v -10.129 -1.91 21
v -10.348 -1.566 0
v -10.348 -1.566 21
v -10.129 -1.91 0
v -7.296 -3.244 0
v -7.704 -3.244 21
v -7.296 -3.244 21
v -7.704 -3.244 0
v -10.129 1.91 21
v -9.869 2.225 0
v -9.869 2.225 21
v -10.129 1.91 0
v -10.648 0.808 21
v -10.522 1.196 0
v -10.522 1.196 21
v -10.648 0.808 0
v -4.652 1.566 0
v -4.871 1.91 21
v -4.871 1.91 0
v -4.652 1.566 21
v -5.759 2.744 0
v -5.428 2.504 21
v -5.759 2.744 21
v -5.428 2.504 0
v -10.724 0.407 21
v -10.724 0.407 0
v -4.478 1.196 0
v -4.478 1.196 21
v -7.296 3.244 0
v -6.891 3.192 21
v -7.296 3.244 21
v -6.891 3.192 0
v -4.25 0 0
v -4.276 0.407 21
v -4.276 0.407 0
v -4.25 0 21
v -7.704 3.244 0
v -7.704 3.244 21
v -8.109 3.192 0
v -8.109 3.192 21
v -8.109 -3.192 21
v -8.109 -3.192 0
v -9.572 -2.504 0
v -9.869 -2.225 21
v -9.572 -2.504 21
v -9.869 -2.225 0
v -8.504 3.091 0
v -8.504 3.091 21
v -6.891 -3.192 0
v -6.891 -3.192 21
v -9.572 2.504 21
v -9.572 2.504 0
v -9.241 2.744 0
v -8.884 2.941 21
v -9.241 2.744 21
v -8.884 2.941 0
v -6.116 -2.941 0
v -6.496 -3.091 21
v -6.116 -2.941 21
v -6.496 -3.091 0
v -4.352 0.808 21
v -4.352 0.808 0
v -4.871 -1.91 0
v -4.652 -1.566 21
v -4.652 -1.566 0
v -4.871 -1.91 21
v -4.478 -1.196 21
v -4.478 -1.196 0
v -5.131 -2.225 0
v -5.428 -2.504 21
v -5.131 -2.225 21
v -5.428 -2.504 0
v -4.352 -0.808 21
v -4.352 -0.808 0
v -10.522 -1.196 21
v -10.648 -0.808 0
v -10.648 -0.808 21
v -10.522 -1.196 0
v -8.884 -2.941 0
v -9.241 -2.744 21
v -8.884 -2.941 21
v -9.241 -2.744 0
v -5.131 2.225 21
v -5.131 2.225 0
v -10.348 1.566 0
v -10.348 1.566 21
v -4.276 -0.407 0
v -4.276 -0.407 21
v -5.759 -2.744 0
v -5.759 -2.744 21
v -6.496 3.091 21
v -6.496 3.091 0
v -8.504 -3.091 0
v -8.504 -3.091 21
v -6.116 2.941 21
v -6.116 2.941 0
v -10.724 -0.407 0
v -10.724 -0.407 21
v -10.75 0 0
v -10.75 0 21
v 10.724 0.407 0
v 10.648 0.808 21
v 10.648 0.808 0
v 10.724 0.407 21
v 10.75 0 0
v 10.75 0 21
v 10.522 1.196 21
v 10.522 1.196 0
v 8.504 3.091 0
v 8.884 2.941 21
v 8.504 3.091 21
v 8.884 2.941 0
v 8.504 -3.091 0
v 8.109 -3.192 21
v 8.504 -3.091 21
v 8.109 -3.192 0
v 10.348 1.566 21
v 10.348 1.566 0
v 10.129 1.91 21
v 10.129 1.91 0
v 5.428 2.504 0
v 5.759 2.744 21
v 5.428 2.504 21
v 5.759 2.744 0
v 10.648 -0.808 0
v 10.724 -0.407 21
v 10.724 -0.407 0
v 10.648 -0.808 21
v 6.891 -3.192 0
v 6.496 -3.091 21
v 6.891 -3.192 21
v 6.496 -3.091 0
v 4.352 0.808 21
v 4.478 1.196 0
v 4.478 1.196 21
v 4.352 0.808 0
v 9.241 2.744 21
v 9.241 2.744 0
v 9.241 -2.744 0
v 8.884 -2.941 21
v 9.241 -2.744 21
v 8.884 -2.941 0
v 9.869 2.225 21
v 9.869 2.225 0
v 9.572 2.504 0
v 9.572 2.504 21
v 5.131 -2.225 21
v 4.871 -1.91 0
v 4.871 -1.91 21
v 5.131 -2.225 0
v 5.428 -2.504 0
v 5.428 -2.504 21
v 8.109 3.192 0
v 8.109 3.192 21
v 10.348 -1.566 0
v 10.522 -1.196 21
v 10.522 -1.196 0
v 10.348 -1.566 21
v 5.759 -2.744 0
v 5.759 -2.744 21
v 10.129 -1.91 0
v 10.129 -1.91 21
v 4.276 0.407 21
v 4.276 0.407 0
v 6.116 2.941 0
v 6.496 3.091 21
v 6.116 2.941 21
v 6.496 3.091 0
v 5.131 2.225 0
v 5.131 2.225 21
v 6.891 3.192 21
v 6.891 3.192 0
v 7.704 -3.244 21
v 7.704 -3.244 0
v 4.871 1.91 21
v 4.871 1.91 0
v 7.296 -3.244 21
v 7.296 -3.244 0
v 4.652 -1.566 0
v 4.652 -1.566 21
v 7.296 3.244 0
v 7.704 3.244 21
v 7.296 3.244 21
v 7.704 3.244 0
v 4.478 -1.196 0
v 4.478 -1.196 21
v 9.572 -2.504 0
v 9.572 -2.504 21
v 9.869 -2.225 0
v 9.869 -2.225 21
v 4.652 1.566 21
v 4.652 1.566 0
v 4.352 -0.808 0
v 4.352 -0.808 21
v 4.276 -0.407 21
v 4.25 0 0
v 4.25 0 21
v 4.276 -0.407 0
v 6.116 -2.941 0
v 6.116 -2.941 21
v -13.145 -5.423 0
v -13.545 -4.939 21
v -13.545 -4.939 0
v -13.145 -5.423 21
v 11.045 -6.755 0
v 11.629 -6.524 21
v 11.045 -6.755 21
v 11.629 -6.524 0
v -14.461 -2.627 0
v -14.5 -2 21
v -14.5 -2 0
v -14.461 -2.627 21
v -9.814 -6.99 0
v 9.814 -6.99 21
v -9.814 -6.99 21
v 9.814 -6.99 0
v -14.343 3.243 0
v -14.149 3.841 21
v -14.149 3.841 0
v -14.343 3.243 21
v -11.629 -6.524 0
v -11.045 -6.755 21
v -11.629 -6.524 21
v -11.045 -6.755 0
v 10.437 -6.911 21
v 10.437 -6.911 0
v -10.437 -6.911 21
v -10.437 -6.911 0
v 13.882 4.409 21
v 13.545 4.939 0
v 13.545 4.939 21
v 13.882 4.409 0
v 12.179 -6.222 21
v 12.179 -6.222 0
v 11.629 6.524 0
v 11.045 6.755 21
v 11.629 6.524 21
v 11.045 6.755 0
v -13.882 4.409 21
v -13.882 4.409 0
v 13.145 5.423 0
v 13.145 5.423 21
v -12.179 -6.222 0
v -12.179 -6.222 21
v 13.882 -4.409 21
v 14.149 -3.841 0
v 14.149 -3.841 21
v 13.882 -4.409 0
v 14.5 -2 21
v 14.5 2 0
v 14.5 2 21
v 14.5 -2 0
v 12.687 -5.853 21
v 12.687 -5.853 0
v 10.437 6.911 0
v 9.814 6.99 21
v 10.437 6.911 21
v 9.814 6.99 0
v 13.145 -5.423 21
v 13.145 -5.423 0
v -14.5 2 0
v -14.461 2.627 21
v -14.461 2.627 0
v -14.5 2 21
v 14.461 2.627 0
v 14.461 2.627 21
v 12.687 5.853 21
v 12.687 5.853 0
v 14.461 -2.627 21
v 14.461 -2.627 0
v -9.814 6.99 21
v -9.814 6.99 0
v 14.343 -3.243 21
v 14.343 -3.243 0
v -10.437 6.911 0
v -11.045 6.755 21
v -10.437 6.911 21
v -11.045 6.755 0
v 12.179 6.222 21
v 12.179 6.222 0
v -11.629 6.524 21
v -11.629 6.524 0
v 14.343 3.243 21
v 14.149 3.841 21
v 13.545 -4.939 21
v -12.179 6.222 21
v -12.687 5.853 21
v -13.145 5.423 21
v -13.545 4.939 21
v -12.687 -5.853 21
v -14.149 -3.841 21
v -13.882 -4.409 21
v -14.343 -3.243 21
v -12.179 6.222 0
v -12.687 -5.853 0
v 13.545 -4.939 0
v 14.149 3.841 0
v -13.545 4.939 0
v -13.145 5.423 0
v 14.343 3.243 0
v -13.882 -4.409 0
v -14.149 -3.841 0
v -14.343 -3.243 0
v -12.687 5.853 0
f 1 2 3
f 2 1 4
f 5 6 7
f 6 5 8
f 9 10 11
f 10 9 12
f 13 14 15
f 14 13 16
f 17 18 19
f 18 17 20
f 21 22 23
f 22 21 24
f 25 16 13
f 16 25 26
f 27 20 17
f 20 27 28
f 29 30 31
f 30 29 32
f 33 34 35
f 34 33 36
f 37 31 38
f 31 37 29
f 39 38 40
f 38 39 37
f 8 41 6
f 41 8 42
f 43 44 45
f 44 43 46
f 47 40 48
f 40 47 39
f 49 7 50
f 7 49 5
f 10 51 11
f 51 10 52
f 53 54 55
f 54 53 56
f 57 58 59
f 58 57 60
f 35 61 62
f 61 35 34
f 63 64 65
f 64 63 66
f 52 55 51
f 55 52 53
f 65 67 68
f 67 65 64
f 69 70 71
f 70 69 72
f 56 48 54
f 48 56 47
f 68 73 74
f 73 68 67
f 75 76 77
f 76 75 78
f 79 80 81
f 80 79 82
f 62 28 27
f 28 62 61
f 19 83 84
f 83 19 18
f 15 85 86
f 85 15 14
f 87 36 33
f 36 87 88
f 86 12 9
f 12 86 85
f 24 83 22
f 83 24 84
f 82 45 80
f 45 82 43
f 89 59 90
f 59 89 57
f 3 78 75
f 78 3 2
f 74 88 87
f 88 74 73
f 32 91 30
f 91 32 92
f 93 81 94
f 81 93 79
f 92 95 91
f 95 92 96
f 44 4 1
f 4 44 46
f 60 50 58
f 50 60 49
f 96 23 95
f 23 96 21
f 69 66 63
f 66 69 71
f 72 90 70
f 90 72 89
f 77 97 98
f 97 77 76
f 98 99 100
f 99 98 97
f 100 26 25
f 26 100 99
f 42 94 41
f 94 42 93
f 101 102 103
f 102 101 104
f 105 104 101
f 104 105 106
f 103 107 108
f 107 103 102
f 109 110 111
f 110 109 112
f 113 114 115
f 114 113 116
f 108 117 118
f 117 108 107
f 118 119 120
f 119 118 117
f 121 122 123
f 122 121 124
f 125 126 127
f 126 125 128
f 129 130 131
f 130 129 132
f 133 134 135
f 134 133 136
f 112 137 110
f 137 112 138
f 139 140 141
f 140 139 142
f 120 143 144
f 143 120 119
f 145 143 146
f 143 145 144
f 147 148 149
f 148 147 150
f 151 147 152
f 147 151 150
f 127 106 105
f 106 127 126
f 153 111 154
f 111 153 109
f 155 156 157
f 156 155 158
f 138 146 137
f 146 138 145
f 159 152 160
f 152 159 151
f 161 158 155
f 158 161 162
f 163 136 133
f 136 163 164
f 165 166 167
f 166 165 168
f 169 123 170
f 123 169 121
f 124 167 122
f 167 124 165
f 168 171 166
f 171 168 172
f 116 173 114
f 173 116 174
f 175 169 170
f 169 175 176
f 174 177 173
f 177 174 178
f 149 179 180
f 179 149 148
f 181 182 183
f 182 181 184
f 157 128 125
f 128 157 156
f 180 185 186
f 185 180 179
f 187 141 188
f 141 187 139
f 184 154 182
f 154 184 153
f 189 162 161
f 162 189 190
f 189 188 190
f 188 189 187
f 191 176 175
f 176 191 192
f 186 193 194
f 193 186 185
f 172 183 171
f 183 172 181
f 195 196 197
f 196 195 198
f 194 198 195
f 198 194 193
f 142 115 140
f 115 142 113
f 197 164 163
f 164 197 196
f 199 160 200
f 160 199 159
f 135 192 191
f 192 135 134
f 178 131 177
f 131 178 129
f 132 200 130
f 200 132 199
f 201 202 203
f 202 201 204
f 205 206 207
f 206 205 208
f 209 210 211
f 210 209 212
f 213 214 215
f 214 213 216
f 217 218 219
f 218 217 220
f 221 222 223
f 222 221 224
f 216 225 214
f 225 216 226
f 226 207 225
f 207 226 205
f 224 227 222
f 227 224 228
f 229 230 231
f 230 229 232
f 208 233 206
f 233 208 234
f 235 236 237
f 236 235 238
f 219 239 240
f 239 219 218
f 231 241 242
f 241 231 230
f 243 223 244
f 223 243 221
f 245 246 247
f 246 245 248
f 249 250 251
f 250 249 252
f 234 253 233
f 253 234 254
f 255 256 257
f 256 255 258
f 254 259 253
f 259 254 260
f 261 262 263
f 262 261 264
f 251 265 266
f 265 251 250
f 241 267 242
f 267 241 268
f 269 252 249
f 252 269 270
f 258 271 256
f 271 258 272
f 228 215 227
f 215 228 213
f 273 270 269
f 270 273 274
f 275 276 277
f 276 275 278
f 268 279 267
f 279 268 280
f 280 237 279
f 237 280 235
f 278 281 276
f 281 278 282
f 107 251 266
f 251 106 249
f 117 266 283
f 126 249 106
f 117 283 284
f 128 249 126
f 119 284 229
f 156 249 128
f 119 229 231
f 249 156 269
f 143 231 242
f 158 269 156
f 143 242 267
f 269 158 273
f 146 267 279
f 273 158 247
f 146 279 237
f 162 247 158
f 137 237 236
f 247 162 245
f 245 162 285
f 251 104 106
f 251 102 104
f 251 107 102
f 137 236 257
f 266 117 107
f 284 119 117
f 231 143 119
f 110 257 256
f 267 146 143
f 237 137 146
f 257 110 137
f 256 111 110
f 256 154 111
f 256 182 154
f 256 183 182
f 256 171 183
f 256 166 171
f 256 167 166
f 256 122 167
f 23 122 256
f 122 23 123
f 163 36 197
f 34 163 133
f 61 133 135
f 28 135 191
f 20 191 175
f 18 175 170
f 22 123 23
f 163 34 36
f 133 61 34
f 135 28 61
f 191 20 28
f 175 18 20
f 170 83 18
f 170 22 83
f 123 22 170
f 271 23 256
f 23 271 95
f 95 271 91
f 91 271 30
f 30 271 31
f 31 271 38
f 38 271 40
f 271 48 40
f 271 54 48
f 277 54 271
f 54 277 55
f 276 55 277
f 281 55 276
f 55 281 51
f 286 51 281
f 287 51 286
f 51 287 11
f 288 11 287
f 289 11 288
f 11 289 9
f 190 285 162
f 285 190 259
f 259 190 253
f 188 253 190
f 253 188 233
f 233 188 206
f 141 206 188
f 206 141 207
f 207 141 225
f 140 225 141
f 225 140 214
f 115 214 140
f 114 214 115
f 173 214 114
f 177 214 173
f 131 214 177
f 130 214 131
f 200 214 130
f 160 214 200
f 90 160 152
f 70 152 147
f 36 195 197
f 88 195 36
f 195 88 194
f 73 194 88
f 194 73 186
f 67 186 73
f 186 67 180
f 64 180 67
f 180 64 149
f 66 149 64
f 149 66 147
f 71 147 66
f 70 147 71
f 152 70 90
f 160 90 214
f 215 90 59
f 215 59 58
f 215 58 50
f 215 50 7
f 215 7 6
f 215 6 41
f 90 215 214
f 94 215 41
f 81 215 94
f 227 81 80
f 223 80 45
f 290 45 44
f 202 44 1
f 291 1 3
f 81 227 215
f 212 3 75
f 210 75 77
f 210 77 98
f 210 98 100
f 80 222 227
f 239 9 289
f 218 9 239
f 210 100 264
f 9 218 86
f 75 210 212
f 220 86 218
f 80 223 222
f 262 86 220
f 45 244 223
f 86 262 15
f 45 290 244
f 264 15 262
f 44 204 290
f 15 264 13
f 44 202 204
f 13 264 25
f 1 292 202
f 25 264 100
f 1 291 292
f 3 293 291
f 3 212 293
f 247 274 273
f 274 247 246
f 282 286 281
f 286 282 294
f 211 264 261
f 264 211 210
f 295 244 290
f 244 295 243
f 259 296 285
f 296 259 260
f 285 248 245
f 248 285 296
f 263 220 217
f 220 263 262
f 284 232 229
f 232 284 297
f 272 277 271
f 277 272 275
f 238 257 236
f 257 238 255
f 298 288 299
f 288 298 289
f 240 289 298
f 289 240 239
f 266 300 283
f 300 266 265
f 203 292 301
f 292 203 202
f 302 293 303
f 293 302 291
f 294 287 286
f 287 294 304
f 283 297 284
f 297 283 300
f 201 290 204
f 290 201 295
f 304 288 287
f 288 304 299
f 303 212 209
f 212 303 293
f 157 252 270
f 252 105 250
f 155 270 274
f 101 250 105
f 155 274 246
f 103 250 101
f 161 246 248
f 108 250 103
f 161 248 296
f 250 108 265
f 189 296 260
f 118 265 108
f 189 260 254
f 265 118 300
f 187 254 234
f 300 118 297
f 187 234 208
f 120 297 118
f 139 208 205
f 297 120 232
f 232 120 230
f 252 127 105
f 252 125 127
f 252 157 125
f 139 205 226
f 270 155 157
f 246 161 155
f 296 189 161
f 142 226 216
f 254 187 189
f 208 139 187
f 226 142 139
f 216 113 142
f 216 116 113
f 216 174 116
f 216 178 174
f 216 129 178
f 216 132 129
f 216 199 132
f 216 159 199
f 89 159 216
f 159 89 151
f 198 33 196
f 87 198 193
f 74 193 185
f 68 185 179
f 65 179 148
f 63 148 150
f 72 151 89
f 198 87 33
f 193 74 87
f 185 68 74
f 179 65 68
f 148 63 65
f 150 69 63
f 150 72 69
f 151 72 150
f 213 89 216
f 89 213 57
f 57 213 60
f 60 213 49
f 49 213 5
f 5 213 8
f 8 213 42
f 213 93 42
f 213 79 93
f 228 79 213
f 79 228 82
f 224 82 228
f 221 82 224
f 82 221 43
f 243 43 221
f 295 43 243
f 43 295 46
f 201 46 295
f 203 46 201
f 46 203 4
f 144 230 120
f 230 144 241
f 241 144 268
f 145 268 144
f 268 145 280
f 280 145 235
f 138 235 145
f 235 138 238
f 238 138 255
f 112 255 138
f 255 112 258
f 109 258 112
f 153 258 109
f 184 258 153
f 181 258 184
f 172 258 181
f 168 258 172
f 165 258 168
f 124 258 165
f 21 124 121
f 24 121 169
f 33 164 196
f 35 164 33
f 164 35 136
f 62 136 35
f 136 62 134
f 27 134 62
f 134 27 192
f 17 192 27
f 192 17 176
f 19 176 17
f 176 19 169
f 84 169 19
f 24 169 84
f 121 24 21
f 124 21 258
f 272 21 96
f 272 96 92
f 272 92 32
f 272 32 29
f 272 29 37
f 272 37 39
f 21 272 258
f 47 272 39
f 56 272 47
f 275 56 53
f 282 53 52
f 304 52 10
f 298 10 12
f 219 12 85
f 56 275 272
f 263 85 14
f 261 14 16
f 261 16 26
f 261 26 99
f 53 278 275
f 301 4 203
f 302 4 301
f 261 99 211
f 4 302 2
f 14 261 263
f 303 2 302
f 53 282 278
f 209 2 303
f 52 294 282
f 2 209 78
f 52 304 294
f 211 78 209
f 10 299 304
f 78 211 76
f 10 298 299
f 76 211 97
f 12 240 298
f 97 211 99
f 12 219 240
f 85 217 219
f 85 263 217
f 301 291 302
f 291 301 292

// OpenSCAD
$fn = 50;


difference() {
	union() {
		hull() {
			translate(v = [-9.5000000000, 2.0000000000, 0]) {
				cylinder(h = 21, r = 5);
			}
			translate(v = [9.5000000000, 2.0000000000, 0]) {
				cylinder(h = 21, r = 5);
			}
			translate(v = [-9.5000000000, -2.0000000000, 0]) {
				cylinder(h = 21, r = 5);
			}
			translate(v = [9.5000000000, -2.0000000000, 0]) {
				cylinder(h = 21, r = 5);
			}
		}
	}
	union() {
		translate(v = [-7.5000000000, 0.0000000000, -100.0000000000]) {
			cylinder(h = 200, r = 3.2500000000);
		}
		translate(v = [-7.5000000000, 0.0000000000, -100.0000000000]) {
			cylinder(h = 200, r = 3.2500000000);
		}
		translate(v = [7.5000000000, 0.0000000000, -100.0000000000]) {
			cylinder(h = 200, r = 3.2500000000);
		}
		translate(v = [7.5000000000, 0.0000000000, -100.0000000000]) {
			cylinder(h = 200, r = 3.2500000000);
		}
	}
}
